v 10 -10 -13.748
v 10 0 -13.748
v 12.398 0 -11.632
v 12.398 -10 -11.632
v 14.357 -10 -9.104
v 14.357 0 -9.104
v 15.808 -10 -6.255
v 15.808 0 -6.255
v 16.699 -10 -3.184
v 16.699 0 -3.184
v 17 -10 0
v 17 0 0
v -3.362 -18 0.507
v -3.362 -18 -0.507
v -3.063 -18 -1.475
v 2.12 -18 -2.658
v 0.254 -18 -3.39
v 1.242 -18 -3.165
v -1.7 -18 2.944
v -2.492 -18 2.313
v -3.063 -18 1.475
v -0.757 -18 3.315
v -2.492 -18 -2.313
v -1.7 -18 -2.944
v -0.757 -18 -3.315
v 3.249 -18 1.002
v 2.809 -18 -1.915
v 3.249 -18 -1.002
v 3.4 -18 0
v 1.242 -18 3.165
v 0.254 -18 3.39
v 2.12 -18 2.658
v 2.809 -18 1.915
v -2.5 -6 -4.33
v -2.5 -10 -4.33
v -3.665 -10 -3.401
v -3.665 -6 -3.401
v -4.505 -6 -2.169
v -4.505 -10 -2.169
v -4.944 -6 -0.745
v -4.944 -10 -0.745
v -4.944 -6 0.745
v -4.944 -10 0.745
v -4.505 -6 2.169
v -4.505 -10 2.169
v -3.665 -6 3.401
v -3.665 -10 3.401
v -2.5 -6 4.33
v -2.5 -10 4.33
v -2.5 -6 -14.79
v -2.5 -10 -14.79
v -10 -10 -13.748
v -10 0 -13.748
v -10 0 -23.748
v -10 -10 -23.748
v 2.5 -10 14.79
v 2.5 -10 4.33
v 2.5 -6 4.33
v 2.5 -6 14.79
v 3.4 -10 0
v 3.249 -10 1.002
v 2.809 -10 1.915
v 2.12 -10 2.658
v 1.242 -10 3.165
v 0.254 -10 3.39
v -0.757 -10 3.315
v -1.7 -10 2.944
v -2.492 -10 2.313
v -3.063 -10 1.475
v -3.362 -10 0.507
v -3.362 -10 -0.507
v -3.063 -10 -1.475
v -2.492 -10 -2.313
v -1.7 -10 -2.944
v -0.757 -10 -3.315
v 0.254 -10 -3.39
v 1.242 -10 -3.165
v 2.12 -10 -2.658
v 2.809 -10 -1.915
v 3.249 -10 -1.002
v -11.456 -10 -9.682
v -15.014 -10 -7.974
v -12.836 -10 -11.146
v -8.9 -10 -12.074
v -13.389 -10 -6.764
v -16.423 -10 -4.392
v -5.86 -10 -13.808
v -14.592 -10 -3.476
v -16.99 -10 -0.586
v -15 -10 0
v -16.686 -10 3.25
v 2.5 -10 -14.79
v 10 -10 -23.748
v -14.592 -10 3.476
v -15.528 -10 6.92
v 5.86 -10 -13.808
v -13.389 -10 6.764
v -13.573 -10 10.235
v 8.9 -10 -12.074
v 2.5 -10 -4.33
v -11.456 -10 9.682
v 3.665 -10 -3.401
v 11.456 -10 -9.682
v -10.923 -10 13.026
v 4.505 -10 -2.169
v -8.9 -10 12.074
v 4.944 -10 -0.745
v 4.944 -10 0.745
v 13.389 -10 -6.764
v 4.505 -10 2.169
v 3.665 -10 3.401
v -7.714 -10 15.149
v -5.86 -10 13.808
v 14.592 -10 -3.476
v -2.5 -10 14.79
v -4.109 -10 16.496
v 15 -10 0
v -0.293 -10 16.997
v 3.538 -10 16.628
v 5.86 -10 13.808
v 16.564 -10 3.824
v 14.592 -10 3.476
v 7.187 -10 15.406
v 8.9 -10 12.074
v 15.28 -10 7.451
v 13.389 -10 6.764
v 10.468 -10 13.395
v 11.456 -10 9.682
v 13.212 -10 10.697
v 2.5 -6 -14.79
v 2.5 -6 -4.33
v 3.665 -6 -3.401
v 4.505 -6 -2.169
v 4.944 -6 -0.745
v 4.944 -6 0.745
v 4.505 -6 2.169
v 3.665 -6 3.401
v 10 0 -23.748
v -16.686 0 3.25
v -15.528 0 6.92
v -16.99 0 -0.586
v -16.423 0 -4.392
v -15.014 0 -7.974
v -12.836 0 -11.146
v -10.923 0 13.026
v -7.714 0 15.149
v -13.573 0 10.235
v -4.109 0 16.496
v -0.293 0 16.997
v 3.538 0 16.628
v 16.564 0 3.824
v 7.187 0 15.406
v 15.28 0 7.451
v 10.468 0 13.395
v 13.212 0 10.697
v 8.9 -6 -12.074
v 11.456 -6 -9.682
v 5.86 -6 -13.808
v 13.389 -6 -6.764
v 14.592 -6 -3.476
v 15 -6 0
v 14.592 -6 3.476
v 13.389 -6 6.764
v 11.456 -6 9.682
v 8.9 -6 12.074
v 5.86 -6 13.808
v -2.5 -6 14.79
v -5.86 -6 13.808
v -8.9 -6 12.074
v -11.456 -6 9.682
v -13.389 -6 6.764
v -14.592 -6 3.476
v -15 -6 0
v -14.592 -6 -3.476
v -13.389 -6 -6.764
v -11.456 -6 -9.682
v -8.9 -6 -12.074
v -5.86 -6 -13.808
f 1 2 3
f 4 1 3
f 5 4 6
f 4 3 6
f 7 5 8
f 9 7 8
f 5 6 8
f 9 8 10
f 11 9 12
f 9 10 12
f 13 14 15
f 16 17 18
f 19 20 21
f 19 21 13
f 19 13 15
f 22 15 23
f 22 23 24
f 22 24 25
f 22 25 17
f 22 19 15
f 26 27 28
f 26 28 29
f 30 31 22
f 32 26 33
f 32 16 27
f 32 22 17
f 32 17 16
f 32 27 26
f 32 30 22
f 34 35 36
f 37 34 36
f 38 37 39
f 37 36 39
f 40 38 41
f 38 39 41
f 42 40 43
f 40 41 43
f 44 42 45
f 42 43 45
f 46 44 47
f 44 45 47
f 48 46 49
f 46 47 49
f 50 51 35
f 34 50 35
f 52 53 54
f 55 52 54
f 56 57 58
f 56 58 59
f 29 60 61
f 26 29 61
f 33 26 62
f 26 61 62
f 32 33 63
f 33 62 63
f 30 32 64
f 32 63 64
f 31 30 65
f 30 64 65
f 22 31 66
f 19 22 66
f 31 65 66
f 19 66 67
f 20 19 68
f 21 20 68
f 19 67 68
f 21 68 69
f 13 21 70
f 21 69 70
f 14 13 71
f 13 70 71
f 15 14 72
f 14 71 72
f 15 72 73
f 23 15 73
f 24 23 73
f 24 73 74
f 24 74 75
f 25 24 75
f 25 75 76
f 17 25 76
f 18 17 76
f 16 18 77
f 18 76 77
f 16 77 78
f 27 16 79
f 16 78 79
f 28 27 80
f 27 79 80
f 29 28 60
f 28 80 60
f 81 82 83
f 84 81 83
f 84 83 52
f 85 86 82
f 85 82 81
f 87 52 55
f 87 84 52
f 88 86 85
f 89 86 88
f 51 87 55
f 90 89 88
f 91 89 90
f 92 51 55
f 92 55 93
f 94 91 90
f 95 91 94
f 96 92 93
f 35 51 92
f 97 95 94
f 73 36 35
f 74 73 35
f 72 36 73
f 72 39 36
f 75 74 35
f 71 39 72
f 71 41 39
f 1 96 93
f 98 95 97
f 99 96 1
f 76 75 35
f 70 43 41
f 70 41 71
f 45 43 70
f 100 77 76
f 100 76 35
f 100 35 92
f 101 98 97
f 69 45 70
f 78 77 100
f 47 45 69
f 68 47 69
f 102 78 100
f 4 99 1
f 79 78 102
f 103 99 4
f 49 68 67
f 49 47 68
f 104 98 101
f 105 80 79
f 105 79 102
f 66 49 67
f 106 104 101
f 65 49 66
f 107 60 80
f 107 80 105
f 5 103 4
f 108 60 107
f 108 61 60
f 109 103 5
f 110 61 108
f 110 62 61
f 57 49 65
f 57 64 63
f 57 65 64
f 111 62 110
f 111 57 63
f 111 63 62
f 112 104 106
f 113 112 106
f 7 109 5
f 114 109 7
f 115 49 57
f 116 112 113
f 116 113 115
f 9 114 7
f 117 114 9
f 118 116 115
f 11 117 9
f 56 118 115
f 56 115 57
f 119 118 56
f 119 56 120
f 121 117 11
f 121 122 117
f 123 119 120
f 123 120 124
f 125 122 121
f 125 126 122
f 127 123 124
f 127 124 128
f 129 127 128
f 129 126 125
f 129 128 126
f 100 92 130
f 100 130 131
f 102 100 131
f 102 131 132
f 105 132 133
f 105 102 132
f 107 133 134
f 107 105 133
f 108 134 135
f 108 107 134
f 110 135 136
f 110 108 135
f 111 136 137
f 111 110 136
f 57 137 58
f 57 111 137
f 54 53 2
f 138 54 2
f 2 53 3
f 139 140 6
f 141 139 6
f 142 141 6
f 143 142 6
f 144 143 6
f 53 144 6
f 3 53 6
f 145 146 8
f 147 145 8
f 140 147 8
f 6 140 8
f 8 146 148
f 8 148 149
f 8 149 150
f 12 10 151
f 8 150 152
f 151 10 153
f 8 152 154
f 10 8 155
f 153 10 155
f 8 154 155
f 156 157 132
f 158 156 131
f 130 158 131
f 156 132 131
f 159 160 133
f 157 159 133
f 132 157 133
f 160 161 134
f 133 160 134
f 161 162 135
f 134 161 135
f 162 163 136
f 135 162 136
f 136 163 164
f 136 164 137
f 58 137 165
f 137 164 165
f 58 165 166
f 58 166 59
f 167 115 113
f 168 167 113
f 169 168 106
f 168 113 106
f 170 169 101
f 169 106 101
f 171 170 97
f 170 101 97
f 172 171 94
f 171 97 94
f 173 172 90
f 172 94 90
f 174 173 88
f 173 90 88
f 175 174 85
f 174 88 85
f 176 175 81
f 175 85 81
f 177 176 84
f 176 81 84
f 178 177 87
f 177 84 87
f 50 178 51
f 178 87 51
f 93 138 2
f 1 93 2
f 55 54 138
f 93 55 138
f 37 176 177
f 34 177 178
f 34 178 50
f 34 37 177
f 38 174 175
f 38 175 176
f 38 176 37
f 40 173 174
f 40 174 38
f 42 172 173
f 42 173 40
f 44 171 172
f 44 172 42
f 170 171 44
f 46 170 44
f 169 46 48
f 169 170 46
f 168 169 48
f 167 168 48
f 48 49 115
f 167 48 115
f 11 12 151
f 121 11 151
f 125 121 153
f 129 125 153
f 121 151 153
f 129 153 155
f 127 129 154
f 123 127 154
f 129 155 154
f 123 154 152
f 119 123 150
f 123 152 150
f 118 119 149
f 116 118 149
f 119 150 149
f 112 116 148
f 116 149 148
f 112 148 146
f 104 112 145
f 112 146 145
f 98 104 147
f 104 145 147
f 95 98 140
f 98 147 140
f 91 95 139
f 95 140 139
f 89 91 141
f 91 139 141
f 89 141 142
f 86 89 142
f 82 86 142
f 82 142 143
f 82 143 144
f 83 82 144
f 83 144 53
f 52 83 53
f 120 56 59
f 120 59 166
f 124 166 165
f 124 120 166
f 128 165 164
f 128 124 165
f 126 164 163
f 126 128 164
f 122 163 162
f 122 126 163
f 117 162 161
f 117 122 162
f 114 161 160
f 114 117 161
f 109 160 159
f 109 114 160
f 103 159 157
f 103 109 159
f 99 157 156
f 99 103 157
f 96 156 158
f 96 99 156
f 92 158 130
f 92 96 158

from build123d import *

# Parameters (mm, degrees)
F1_DEPTH = 10
F3_DEPTH = 4
F4_R     = 3.4
F5_DEPTH = 8


# Not quite as in the source:
# - a feature of the source that left no trace in its solid (it failed there, or was rolled back) is left out
# - a pattern or mirror of a feature is missing from the dataset's text; its kind, count and spacing are read off the source's solid


with BuildPart() as f1:
    # F0 (on Front) → F1 (new body)
    with BuildSketch(Plane.XZ):
        with BuildLine():
            ThreePointArc((10, -13.7477270849), (15.1492574075, -7.7136243103), (17, 0))
            ThreePointArc((17, 0), (-7.7136243103, 15.1492574075), (-10, -13.7477270849))
            ThreePointArc((-10, -13.7477270849), (0, -17), (10, -13.7477270849))
        make_face()
        with BuildLine():
            ThreePointArc((10, -13.7477270849), (0, -17), (-10, -13.7477270849))
            Line((-10, -13.7477270849), (-10, -23.7477270849))
            Line((-10, -23.7477270849), (10, -23.7477270849))
            Line((10, -23.7477270849), (10, -13.7477270849))
        make_face()
    extrude(amount=F1_DEPTH)

    # F2 (on face) → F3 (cut)
    with BuildSketch(Plane.XZ.offset(10)):
        with BuildLine():
            Line((-2.5, 4.3301270189), (-2.5, 14.7901994577))
            ThreePointArc((-2.5, 14.7901994577), (-15, 0), (-2.5, -14.7901994577))
            Line((-2.5, -14.7901994577), (-2.5, -4.3301270189))
            ThreePointArc((-2.5, -4.3301270189), (-5, 0), (-2.5, 4.3301270189))
        make_face()
    f3 = extrude(amount=-F3_DEPTH, mode=Mode.SUBTRACT)

    # F3_copies: F3 across plane
    add(f3.mirror(Plane(origin=(0, 0, 0), x_dir=(0, 0, 1), z_dir=(1, 0, 0))), mode=Mode.SUBTRACT)

    # F4 (on face) → F5 (join)
    with BuildSketch(Plane.XZ.offset(10)):
        Circle(F4_R)
    extrude(amount=F5_DEPTH)


solid = f1.part
